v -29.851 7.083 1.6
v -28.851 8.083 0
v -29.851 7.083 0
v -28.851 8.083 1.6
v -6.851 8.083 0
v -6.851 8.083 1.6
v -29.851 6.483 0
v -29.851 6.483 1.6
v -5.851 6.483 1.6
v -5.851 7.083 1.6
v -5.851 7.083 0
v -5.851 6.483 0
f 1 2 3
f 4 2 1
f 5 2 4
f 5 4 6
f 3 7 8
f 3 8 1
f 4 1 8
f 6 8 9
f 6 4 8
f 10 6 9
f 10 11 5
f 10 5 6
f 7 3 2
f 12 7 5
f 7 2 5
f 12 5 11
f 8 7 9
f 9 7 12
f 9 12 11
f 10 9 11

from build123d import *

# Parameters (mm, degrees)
F0_W     = 24
F0_H     = 1.6
F1_DEPTH = 1.6
F2_SIZE2 = 1
F2_SIZE  = 1
F3_SIZE  = 1


with BuildPart() as f1:
    # F0 (on Top) → F1 (new body)
    with BuildSketch(Plane.XY):
        with Locations((-17.850905, 7.283434)):
            Rectangle(F0_W, F0_H)
    extrude(amount=F1_DEPTH)

    # F2
    f2_edges = [f1.edges().sort_by_distance(p)[0] for p in [
        (-29.850905, 8.083434, 0.8),
    ]]
    chamfer(f2_edges, length=F2_SIZE, length2=F2_SIZE2)

    # F3
    f3_edges = [f1.edges().sort_by_distance(p)[0] for p in [
        (-5.850905, 8.083434, 0.8),
    ]]
    chamfer(f3_edges, length=F3_SIZE)


solid = f1.part
